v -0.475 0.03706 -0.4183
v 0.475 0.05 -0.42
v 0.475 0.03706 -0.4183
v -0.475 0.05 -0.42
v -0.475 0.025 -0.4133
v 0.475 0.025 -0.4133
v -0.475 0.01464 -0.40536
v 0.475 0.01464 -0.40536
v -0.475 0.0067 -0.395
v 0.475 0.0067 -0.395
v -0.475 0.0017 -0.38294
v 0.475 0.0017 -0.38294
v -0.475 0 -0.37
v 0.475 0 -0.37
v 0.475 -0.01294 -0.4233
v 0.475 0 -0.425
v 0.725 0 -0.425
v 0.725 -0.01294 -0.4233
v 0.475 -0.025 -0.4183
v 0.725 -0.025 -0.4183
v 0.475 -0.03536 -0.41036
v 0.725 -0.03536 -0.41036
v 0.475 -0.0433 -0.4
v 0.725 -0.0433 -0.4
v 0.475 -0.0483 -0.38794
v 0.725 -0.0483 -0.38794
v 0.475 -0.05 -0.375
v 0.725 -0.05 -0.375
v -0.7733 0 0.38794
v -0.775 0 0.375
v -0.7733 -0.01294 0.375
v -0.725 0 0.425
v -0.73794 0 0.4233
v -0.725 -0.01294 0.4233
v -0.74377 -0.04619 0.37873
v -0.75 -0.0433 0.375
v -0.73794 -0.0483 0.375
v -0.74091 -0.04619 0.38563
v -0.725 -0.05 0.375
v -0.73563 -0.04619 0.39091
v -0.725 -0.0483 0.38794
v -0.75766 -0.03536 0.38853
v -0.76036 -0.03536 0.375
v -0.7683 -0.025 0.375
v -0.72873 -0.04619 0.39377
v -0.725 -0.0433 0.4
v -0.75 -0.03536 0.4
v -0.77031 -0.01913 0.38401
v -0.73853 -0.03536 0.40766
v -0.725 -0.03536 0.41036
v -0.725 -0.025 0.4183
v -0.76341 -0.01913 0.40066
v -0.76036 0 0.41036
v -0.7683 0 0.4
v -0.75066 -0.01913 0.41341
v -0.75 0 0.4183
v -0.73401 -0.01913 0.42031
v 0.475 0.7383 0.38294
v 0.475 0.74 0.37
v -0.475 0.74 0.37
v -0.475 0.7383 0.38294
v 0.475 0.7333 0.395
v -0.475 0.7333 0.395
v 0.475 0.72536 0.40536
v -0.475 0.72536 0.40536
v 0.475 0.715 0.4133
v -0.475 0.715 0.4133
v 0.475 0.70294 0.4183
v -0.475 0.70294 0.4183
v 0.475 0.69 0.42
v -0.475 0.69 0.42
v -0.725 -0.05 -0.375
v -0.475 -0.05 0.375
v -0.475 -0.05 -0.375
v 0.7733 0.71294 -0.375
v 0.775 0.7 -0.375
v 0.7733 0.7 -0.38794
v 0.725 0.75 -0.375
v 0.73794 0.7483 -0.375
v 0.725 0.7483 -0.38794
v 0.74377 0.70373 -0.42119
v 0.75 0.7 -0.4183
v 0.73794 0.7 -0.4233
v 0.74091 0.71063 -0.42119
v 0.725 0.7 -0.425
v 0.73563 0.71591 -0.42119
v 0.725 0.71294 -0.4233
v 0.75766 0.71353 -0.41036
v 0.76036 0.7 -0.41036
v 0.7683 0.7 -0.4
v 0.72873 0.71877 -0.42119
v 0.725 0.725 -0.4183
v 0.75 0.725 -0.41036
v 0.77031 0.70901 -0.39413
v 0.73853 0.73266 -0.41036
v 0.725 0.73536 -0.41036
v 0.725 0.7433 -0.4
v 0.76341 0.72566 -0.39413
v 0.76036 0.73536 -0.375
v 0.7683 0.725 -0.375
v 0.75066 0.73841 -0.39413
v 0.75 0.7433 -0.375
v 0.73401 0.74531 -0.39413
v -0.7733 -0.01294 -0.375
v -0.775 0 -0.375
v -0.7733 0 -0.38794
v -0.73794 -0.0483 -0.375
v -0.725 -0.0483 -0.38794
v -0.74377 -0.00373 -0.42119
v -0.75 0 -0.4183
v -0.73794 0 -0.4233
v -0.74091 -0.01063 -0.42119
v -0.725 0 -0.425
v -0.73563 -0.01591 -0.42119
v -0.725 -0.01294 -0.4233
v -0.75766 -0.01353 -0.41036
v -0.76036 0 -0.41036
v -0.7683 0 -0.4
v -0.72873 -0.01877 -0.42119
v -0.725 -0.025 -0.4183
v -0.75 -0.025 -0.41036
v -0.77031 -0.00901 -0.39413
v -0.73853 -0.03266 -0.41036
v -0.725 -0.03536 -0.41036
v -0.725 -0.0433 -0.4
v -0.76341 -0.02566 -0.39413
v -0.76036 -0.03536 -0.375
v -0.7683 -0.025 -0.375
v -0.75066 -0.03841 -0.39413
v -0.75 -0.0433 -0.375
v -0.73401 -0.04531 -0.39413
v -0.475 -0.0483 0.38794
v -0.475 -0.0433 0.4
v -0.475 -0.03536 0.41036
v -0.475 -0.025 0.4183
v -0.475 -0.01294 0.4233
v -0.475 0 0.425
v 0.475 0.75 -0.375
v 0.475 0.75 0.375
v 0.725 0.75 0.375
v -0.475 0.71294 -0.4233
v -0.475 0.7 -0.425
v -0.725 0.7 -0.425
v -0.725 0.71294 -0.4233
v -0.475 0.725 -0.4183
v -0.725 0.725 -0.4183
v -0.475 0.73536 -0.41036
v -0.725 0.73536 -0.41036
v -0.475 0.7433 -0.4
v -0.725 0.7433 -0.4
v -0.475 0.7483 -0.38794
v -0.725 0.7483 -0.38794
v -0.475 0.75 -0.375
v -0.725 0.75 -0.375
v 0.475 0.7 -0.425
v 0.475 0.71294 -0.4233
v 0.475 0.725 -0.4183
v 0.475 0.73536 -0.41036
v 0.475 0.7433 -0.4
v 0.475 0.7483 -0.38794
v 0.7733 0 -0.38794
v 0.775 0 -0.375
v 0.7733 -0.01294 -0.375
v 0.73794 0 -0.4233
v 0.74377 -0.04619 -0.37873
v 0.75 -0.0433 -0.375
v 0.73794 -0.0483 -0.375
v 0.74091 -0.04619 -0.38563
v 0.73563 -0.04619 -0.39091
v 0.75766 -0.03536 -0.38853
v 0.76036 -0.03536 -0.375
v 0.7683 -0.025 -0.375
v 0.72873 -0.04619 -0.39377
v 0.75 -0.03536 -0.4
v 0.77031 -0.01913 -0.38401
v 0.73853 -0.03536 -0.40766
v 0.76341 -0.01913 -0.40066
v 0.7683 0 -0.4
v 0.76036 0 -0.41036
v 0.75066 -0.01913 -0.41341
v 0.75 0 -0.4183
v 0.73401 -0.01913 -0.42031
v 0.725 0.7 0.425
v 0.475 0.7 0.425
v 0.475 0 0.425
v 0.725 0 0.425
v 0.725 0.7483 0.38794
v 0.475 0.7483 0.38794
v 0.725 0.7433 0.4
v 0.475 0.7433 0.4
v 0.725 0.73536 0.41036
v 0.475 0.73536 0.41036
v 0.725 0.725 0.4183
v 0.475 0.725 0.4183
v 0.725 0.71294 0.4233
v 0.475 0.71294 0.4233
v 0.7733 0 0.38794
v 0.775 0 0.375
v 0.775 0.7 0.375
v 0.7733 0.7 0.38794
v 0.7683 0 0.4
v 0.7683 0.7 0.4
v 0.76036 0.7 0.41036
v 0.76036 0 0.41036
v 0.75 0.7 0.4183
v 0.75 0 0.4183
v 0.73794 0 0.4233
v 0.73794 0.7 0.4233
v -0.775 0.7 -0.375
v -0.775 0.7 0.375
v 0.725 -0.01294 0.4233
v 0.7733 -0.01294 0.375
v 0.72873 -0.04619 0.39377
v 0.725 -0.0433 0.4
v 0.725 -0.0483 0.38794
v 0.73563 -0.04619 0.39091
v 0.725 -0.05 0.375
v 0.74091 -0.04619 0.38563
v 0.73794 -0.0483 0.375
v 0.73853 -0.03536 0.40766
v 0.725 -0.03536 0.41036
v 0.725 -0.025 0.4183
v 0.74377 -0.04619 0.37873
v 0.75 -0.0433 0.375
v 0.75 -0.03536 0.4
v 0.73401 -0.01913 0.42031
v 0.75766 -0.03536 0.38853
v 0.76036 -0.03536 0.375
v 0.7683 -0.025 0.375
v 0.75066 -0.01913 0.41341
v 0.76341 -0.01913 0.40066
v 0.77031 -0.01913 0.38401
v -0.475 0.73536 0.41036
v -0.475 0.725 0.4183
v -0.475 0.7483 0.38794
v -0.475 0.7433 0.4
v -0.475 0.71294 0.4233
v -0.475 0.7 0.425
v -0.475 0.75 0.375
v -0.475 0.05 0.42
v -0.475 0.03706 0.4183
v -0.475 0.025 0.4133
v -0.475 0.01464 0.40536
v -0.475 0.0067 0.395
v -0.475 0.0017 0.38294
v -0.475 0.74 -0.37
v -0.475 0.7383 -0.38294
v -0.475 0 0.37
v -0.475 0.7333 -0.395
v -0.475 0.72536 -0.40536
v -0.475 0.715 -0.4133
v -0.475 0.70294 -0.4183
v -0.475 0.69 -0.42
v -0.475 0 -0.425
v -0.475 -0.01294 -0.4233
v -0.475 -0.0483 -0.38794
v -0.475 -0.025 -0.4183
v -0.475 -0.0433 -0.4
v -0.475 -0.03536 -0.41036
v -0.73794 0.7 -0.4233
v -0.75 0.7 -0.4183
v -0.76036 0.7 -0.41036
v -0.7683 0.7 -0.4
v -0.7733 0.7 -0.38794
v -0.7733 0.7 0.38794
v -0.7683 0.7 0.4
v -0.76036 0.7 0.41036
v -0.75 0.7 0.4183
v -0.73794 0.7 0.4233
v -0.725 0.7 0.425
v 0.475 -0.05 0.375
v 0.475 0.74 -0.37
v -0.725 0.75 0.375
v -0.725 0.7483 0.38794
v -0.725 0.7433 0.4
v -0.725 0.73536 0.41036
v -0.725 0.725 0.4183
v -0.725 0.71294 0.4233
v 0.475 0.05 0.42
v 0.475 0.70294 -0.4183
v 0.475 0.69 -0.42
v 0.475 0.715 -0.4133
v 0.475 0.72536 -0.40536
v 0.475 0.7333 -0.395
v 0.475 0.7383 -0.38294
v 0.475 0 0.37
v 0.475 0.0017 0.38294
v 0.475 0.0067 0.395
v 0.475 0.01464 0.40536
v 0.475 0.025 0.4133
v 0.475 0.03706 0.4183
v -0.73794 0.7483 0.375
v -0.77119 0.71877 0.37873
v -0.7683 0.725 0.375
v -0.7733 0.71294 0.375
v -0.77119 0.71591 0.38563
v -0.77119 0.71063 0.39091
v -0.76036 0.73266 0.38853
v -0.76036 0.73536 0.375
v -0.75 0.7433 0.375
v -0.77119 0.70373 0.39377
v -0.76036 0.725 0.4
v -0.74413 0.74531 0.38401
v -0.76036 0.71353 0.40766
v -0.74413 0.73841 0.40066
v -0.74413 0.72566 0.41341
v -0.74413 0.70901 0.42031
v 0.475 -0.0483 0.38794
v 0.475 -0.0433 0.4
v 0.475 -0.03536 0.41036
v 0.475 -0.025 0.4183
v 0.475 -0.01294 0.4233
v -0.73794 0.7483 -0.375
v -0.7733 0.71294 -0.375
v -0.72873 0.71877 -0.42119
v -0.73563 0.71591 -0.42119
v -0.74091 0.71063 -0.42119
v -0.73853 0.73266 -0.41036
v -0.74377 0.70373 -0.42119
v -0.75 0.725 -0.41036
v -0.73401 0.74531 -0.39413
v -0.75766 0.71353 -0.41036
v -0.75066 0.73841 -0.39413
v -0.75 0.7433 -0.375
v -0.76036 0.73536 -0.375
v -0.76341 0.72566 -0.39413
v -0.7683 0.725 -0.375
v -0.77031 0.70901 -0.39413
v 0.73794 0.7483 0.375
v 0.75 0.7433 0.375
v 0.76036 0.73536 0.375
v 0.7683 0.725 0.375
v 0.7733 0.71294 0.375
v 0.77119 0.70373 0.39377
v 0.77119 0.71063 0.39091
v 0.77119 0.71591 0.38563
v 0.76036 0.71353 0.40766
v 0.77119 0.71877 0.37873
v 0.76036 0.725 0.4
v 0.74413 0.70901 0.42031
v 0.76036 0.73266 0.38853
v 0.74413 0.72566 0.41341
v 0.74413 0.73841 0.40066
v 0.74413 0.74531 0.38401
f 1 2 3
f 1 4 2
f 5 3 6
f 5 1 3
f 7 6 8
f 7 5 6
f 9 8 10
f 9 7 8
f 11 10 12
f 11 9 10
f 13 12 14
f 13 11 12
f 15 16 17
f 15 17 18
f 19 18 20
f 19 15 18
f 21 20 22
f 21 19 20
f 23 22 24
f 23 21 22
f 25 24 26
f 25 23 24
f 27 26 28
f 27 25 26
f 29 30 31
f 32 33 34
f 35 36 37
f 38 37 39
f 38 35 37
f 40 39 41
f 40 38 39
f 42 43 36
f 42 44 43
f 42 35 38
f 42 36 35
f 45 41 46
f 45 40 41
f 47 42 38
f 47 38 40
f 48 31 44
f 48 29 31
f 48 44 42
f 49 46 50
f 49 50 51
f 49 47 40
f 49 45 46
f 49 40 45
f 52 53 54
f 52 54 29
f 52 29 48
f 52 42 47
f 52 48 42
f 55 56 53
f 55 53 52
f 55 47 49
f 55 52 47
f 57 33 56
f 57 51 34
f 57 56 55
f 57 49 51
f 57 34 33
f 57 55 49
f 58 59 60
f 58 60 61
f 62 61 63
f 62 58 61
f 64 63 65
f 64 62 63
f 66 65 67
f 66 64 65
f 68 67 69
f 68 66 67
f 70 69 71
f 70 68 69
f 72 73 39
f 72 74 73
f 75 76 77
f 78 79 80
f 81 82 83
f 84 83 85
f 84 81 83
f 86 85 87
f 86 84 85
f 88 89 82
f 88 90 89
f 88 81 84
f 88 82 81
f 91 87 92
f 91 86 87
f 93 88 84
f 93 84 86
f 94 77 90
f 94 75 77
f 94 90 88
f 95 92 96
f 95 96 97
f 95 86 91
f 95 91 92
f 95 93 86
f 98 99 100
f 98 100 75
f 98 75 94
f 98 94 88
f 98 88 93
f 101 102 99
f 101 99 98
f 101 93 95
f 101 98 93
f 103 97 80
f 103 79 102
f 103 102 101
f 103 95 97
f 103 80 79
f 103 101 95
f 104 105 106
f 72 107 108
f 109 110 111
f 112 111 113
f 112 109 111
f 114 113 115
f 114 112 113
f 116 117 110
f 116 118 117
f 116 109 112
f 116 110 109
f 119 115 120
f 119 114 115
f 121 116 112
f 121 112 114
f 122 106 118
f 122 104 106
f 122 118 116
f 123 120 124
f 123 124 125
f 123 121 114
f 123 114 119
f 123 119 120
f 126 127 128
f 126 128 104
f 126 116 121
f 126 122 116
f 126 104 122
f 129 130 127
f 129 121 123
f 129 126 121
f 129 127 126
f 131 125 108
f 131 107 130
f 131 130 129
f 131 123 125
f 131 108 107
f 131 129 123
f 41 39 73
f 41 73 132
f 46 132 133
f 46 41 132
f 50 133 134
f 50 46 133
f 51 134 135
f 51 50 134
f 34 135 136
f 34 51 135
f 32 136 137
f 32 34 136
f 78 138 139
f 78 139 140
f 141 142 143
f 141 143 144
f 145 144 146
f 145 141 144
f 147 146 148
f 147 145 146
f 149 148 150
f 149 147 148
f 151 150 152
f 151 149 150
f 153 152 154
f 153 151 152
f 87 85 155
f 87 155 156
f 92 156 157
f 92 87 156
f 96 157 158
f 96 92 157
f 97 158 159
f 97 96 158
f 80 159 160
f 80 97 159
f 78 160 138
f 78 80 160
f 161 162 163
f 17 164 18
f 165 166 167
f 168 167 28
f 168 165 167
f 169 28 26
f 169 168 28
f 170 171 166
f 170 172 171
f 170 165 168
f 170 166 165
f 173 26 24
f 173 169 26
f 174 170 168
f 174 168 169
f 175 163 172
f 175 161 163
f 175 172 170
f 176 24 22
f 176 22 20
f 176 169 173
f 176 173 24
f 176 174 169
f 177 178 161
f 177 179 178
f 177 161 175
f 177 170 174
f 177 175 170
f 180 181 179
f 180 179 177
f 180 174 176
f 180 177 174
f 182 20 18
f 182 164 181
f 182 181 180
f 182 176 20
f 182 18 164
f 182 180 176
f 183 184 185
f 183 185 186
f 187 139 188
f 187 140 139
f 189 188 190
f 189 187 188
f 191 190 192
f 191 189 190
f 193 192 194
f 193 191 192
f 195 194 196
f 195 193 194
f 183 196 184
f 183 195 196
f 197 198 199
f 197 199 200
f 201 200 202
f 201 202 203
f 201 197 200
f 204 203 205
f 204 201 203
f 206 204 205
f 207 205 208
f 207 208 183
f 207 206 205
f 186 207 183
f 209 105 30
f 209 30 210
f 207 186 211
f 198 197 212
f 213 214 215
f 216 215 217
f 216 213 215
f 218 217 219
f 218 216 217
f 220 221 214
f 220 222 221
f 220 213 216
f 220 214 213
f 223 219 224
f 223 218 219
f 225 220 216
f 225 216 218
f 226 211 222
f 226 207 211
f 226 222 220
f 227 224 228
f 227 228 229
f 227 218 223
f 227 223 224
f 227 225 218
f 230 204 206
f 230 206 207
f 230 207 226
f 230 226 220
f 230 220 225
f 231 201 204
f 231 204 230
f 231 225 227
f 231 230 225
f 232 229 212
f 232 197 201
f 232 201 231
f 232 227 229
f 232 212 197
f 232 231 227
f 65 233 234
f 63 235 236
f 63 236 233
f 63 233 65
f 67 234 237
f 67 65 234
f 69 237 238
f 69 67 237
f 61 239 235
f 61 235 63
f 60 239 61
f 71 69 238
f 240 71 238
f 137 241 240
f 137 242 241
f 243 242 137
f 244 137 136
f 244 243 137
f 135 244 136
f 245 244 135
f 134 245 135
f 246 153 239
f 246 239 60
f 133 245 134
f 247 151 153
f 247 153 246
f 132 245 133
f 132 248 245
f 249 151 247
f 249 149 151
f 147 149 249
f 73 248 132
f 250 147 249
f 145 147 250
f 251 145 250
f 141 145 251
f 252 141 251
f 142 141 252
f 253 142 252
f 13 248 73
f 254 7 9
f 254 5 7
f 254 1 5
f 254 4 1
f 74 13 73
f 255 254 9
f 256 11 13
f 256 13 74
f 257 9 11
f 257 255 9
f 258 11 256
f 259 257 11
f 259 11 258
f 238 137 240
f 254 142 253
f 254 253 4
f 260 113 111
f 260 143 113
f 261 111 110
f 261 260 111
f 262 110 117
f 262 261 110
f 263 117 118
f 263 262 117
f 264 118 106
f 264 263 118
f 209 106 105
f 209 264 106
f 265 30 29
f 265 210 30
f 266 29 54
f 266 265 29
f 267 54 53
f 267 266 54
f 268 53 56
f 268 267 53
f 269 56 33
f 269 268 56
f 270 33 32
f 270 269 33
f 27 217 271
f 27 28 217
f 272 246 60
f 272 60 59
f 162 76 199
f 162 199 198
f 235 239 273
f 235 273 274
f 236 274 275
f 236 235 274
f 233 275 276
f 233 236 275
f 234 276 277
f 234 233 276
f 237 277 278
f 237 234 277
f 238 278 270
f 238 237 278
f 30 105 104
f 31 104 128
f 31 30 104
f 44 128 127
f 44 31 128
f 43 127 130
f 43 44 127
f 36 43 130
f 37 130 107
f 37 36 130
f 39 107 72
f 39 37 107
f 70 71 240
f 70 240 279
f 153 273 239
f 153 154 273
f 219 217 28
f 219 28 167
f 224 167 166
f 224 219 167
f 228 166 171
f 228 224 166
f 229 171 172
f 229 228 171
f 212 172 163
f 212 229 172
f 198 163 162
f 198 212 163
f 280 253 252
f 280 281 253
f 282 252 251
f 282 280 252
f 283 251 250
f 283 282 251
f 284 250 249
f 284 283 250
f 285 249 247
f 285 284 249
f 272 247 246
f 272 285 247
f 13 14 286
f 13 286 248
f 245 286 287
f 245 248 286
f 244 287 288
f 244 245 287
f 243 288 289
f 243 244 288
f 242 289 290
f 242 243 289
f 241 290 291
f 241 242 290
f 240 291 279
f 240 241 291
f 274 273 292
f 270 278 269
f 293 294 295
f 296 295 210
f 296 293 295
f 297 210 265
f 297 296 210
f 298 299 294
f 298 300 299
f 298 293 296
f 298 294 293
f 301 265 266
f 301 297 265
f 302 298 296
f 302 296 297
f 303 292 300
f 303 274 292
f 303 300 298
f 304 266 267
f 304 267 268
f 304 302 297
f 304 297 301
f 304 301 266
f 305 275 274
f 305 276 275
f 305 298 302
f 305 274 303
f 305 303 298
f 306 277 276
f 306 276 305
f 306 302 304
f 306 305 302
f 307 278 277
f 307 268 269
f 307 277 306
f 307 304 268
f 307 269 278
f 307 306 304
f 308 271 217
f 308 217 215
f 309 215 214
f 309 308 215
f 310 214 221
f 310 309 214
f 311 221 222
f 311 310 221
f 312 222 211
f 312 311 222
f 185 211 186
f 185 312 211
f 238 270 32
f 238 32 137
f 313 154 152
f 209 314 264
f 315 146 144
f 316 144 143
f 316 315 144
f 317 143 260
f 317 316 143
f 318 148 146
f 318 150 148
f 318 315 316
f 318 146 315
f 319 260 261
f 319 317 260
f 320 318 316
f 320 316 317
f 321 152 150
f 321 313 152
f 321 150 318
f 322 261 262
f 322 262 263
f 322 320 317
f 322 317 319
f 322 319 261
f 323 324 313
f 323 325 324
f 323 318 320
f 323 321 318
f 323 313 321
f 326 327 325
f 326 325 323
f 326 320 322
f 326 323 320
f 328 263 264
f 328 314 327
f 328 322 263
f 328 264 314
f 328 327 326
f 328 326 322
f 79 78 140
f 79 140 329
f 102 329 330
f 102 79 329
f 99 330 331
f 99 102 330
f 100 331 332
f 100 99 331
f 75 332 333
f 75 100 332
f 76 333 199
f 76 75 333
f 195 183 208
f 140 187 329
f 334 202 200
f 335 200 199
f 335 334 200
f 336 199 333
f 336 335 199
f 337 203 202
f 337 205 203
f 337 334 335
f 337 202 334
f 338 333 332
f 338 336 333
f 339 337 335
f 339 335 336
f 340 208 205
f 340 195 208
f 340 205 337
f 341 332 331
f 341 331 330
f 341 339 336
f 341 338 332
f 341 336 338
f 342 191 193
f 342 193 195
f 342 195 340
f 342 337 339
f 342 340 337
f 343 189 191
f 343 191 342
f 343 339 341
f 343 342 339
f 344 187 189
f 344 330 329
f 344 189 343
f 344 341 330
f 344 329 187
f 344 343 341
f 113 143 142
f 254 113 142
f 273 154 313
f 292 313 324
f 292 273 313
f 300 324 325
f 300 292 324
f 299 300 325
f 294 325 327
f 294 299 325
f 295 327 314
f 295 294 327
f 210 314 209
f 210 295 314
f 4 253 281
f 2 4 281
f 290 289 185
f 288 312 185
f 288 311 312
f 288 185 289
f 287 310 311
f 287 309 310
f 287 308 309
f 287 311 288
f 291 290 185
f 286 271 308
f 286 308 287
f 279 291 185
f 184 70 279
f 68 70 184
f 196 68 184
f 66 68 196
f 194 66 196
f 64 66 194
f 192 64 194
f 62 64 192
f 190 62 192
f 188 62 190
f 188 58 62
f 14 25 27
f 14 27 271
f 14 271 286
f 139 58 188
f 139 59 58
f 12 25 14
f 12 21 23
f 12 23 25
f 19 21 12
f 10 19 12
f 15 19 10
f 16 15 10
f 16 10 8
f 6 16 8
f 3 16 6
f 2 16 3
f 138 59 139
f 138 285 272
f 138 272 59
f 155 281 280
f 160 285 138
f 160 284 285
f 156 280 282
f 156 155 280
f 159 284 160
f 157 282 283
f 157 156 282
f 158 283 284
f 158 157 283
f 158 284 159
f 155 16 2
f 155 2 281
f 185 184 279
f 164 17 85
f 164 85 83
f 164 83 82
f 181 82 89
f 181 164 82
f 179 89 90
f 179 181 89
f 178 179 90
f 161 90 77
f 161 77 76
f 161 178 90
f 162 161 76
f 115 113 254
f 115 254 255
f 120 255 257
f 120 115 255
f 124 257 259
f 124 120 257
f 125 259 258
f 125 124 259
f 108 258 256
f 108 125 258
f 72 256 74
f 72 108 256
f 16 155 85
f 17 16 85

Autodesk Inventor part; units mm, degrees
ref_plane "YZ Plane" through (0, 0, 0) normal (1, 0, 0) x (0, 1, 0)
ref_plane "XZ Plane" through (0, 0, 0) normal (0, 1, 0) x (-1, 0, 0)
ref_plane "XY Plane" through (0, 0, 0) normal (0, 0, 1) x (1, 0, 0)
sketch "Sketch1" plane through (0, 0, 0) normal (0, 0, 1) x (1, 0, 0)
  line L0 (-0.775, 0.75) -> (-0.475, 0.75)
  line L1 (-0.475, 0.75) -> (-0.475, -0.05)
  line L2 (-0.475, -0.05) -> (-0.775, -0.05)
  line L3 (-0.775, -0.05) -> (-0.775, 0.75)
  line L4 (-0.475, 0.74) -> (0.475, 0.74)
  line L5 (0.475, 0.74) -> (0.475, 0)
  line L6 (0.475, 0) -> (-0.475, 0)
  line L7 (-0.475, 0) -> (-0.475, 0.74)
  line L8 (0.475, 0.75) -> (0.775, 0.75)
  line L9 (0.775, 0.75) -> (0.775, -0.05)
  line L10 (0.775, -0.05) -> (0.475, -0.05)
  line L11 (0.475, -0.05) -> (0.475, 0.75)
  point P0 (0, 0)
  point P1 (0, 0.74)
  point P2 (0, 0)
  dimension "d0" = 1.55
  dimension "d1" = 0.8
  dimension "d2" = 0.3
  dimension "d3" = 0.05
  dimension "d6" = 0.01
extrude "Extrusion1" add sketch "Sketch1" along normal mid plane 0.85 contours L0 L1 L2 L3 | L11 L8 L9 L10 L5
extrude "Extrusion2" add sketch "Sketch1" along normal mid plane 0.84 contours L4 L5 L6 L1
fillet "Fillet1" radius 0.05 20 edges at (0, 0.74, 0.42) (0, 0.74, -0.42) (0, 0, 0.42) (0, 0, -0.42) (-0.625, 0.75, 0.425) (-0.775, 0.75, 0) (-0.625, 0.75, -0.425) (-0.775, 0.35, 0.425) (-0.625, -0.05, 0.425) (-0.775, -0.05, 0) (-0.625, -0.05, -0.425) (-0.775, 0.35, -0.425) (0.625, 0.75, 0.425) (0.775, 0.75, 0) (0.625, 0.75, -0.425) (0.775, 0.35, 0.425) (0.775, 0.35, -0.425) (0.775, -0.05, 0) (0.625, -0.05, 0.425) (0.625, -0.05, -0.425)
properties part number "Capacitor_1608-0.8mm" material "Copper"
